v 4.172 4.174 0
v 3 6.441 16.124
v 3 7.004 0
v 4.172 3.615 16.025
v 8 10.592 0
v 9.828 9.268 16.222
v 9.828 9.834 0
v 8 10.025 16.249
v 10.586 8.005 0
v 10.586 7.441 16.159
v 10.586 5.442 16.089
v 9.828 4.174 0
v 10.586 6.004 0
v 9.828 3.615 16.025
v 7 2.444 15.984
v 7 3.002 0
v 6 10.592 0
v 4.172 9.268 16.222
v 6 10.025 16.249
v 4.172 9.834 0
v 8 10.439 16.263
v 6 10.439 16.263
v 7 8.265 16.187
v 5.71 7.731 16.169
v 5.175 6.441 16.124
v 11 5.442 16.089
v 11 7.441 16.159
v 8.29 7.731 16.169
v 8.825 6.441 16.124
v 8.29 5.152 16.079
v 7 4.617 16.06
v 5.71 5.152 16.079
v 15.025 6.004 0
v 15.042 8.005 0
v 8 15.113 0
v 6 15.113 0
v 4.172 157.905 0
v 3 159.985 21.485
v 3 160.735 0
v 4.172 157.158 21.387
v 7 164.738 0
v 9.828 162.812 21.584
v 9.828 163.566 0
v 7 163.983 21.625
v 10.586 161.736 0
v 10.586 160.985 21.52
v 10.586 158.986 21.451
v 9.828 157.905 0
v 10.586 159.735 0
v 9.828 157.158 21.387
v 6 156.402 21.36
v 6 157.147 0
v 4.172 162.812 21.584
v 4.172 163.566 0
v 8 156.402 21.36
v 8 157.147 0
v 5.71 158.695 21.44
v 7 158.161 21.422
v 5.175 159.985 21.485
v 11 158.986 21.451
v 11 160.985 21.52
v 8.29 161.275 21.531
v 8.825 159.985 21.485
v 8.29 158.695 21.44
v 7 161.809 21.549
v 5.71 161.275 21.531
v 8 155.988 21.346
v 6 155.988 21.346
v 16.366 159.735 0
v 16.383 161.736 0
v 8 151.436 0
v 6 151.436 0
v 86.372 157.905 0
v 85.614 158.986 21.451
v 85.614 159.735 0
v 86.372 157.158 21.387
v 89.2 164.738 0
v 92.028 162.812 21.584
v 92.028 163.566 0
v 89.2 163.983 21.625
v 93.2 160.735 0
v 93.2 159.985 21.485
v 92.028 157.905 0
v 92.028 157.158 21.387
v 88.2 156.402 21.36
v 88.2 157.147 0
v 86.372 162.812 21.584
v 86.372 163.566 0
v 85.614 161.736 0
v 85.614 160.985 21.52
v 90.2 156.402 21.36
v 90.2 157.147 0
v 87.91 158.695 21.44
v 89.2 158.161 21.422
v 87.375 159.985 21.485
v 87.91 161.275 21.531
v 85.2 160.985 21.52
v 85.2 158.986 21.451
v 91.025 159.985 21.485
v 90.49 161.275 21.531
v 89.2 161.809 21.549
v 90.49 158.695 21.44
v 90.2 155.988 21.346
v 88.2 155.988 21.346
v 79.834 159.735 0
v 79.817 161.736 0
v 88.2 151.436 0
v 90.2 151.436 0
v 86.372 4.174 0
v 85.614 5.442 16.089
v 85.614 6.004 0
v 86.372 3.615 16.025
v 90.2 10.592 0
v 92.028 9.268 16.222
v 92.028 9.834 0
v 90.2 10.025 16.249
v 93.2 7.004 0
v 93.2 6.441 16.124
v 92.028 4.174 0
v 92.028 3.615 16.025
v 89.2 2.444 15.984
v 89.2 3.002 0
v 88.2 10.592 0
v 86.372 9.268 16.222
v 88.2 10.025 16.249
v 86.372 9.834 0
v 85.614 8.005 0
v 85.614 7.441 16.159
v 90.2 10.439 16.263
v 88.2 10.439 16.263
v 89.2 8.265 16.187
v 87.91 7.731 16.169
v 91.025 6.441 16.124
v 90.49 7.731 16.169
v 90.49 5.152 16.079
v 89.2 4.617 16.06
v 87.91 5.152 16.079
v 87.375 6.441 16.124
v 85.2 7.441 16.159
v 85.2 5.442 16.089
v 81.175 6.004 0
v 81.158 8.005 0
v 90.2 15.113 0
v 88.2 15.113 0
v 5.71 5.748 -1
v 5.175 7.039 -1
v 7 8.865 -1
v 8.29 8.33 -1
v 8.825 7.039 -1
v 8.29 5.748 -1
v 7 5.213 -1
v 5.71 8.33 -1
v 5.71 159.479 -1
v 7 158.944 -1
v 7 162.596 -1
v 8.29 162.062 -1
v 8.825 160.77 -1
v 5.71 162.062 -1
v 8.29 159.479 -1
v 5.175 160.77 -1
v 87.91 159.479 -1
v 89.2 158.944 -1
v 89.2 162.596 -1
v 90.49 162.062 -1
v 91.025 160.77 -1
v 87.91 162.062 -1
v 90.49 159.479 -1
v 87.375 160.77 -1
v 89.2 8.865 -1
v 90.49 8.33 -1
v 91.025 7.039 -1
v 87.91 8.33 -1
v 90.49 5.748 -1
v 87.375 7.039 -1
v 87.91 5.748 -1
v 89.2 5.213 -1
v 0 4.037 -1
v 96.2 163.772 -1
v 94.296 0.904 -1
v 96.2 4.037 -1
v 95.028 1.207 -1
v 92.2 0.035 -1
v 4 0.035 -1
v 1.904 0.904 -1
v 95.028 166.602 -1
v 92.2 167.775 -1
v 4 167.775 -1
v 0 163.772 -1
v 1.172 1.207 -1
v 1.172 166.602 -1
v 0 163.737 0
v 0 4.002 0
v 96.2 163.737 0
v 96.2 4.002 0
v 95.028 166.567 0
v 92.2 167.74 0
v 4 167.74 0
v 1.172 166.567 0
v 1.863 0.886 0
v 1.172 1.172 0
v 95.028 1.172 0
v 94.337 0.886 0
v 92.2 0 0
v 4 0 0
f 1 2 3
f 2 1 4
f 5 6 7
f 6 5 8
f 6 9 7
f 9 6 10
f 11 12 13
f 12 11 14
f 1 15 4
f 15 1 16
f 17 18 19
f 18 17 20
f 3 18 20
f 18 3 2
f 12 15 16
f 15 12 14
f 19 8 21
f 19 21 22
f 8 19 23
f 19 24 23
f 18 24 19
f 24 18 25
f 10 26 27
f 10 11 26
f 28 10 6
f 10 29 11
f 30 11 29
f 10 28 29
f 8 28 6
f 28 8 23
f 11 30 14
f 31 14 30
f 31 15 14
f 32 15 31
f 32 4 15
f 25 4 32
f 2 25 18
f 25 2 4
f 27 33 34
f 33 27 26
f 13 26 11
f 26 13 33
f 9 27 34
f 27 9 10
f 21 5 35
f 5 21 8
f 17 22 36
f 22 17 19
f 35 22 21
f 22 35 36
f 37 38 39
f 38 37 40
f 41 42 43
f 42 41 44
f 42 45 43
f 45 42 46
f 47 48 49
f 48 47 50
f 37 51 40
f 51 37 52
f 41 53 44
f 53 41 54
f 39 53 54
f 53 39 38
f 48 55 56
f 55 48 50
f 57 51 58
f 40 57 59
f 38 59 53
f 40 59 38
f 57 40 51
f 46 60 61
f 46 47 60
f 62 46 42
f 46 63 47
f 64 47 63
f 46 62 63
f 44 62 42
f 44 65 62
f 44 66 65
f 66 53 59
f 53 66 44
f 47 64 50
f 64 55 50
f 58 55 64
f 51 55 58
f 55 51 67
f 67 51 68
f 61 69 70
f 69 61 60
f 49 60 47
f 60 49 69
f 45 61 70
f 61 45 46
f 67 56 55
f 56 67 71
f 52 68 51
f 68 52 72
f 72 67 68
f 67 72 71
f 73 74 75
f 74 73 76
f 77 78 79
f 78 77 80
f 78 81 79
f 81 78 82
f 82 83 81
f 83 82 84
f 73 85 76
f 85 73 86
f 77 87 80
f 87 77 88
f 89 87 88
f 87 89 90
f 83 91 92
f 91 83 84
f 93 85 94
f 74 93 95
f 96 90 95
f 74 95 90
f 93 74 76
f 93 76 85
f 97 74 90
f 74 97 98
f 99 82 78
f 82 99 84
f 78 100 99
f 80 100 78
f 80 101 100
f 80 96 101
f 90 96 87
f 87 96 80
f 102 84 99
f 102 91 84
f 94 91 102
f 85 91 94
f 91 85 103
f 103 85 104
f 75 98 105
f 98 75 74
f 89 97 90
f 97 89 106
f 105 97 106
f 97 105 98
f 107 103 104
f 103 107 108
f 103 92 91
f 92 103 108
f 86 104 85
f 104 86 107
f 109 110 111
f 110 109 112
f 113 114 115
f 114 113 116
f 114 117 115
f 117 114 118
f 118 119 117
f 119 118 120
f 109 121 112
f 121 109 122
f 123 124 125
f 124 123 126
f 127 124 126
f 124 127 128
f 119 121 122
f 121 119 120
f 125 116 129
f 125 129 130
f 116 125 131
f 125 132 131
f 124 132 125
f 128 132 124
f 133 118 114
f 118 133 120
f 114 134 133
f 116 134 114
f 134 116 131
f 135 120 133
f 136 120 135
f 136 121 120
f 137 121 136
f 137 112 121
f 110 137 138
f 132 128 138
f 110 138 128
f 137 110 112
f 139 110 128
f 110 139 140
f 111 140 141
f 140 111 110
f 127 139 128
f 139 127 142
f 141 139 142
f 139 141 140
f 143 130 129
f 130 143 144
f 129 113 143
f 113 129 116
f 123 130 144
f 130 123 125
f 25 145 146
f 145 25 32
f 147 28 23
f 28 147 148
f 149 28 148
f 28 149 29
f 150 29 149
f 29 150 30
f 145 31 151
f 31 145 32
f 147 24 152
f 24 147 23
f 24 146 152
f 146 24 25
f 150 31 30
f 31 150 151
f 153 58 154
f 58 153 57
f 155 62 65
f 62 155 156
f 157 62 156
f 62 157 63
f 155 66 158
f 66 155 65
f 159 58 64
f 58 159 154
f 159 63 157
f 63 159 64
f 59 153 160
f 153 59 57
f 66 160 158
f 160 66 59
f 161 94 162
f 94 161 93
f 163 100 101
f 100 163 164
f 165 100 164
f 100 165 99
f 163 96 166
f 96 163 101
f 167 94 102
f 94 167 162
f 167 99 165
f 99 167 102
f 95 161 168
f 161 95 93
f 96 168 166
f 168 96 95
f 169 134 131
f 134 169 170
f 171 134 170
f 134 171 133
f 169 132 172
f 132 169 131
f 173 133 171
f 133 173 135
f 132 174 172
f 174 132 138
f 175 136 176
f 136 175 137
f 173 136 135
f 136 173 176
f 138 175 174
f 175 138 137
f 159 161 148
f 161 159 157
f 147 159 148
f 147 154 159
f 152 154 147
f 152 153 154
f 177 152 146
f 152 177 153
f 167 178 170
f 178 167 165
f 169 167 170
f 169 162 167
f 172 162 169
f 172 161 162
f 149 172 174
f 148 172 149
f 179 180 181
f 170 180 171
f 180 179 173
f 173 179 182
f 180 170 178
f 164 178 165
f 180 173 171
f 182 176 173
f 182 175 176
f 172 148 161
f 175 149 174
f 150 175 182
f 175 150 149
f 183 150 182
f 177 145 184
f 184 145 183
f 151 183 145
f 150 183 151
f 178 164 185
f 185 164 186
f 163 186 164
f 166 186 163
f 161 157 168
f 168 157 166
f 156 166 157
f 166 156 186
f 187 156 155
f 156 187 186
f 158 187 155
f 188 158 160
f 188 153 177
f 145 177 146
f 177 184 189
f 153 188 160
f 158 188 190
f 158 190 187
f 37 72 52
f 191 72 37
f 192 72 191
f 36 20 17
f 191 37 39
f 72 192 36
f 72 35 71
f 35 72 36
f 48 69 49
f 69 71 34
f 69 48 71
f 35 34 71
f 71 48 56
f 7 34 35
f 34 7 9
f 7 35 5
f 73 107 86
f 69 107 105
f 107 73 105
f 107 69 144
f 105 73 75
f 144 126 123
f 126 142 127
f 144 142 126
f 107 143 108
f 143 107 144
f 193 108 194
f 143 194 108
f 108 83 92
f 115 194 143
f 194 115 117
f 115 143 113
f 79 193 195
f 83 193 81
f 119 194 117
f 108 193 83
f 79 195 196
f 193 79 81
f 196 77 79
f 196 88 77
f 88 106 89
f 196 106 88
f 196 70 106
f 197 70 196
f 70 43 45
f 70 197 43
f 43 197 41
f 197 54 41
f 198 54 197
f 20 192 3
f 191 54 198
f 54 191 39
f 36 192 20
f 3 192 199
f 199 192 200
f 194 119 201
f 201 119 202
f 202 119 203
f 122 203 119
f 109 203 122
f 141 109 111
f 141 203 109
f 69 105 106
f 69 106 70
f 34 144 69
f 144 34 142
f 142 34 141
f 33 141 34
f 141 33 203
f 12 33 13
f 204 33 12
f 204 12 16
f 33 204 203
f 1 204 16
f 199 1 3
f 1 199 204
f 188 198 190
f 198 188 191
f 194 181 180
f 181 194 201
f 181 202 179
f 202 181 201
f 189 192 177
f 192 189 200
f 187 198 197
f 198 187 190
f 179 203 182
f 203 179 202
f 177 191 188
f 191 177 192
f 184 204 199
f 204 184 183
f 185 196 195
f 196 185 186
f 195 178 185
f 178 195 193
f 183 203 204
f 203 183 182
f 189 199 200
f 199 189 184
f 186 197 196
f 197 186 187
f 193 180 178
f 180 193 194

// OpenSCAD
// Generated by SolidPython 1.1.3 on 2024-07-24 01:34:22
$fn = 8;


difference() {
	intersection() {
		union() {
			difference() {
				rotate(a = 2.0000000000, v = [1, 0, 0]) {
					translate(v = [0, 0, 16.4445000000]) {
						translate(v = [0, 157.6375000000, 0]) {
							translate(v = [10, 0, 0]) {
								difference() {
									translate(v = [-3, 0, 0]) {
										translate(v = [0, -150.6375000000, 0]) {
											translate(v = [0, 0, -68.5555000000]) {
												union() {
													translate(v = [0, 0, 0]) {
														translate(v = [0, 0, 0]) {
															union() {
																cylinder(h = 68, r = 4.0000000000);
																rotate(a = 90, v = [1, 0, 0]) {
																	linear_extrude(center = true, height = 2) {
																		polygon(paths = [[0, 1, 2, 3]], points = [[0, 0], [0, 68], [4.0000000000, 68], [21.0000000000, 0]]);
																	}
																}
																rotate(a = 90, v = [0, 0, 1]) {
																	rotate(a = 90, v = [1, 0, 0]) {
																		linear_extrude(center = true, height = 2) {
																			polygon(paths = [[0, 1, 2, 3]], points = [[0, 0], [0, 68], [4.0000000000, 68], [21.0000000000, 0]]);
																		}
																	}
																}
															}
														}
													}
													translate(v = [0, 0, 0]) {
														translate(v = [0, 153.6375000000, 0]) {
															union() {
																cylinder(h = 68, r = 4.0000000000);
																rotate(a = 90, v = [1, 0, 0]) {
																	linear_extrude(center = true, height = 2) {
																		polygon(paths = [[0, 1, 2, 3]], points = [[0, 0], [0, 68], [4.0000000000, 68], [21.0000000000, 0]]);
																	}
																}
																rotate(a = 270, v = [0, 0, 1]) {
																	rotate(a = 90, v = [1, 0, 0]) {
																		linear_extrude(center = true, height = 2) {
																			polygon(paths = [[0, 1, 2, 3]], points = [[0, 0], [0, 68], [4.0000000000, 68], [21.0000000000, 0]]);
																		}
																	}
																}
															}
														}
													}
													translate(v = [82.2000000000, 0, 0]) {
														translate(v = [0, 153.6375000000, 0]) {
															union() {
																cylinder(h = 68, r = 4.0000000000);
																rotate(a = 180, v = [0, 0, 1]) {
																	rotate(a = 90, v = [1, 0, 0]) {
																		linear_extrude(center = true, height = 2) {
																			polygon(paths = [[0, 1, 2, 3]], points = [[0, 0], [0, 68], [4.0000000000, 68], [21.0000000000, 0]]);
																		}
																	}
																}
																rotate(a = 270, v = [0, 0, 1]) {
																	rotate(a = 90, v = [1, 0, 0]) {
																		linear_extrude(center = true, height = 2) {
																			polygon(paths = [[0, 1, 2, 3]], points = [[0, 0], [0, 68], [4.0000000000, 68], [21.0000000000, 0]]);
																		}
																	}
																}
															}
														}
													}
													translate(v = [82.2000000000, 0, 0]) {
														translate(v = [0, 0, 0]) {
															union() {
																cylinder(h = 68, r = 4.0000000000);
																rotate(a = 180, v = [0, 0, 1]) {
																	rotate(a = 90, v = [1, 0, 0]) {
																		linear_extrude(center = true, height = 2) {
																			polygon(paths = [[0, 1, 2, 3]], points = [[0, 0], [0, 68], [4.0000000000, 68], [21.0000000000, 0]]);
																		}
																	}
																}
																rotate(a = 90, v = [0, 0, 1]) {
																	rotate(a = 90, v = [1, 0, 0]) {
																		linear_extrude(center = true, height = 2) {
																			polygon(paths = [[0, 1, 2, 3]], points = [[0, 0], [0, 68], [4.0000000000, 68], [21.0000000000, 0]]);
																		}
																	}
																}
															}
														}
													}
												}
											}
										}
									}
									translate(v = [-3, 0, 0]) {
										translate(v = [0, -150.6375000000, 0]) {
											union() {
												translate(v = [0, 0, 0]) {
													translate(v = [0, 0, 0]) {
														cylinder(center = true, h = 272, r = 1.8250000000);
													}
												}
												translate(v = [0, 0, 0]) {
													translate(v = [0, 153.6375000000, 0]) {
														cylinder(center = true, h = 272, r = 1.8250000000);
													}
												}
												translate(v = [82.2000000000, 0, 0]) {
													translate(v = [0, 153.6375000000, 0]) {
														cylinder(center = true, h = 272, r = 1.8250000000);
													}
												}
												translate(v = [82.2000000000, 0, 0]) {
													translate(v = [0, 0, 0]) {
														cylinder(center = true, h = 272, r = 1.8250000000);
													}
												}
											}
										}
									}
								}
							}
						}
					}
				}
				translate(v = [0, 0, -1]) {
					translate(v = [0, 0, -100]) {
						translate(v = [0, -83.8187500000, 0]) {
							translate(v = [-48.1000000000, 0, 0]) {
								cube(size = [192.4000000000, 335.2750000000, 100]);
							}
						}
					}
				}
			}
			intersection() {
				translate(v = [0, 0, -1]) {
					translate(v = [-48.1000000000, 0, 0]) {
						translate(v = [0, -83.8187500000, 0]) {
							cube(size = [192.4000000000, 335.2750000000, 1]);
						}
					}
				}
				rotate(a = 2.0000000000, v = [1, 0, 0]) {
					translate(v = [0, 0, 16.4445000000]) {
						translate(v = [0, 157.6375000000, 0]) {
							translate(v = [10, 0, 0]) {
								translate(v = [0, 0, -34.0000000000]) {
									translate(v = [38.1000000000, 0, 0]) {
										translate(v = [0, -73.8187500000, 0]) {
											minkowski() {
												cube(center = true, size = [88.2000000000, 159.6375000000, 68]);
												cylinder(center = true, h = 0.5555000000, r = 4);
											}
										}
									}
								}
							}
						}
					}
				}
			}
		}
		translate(v = [0, 0, 16.4445000000]) {
			translate(v = [0, 157.6375000000, 0]) {
				translate(v = [10, 0, 0]) {
					translate(v = [-10.0000000000, 0, 0]) {
						translate(v = [0, -251.4562500000, 0]) {
							translate(v = [0, 0, -34.0000000000]) {
								cube(size = [96.2000000000, 335.2750000000, 136]);
							}
						}
					}
				}
			}
		}
	}
	rotate(a = 2.0000000000, v = [1, 0, 0]) {
		translate(v = [0, 0, 16.4445000000]) {
			translate(v = [0, 157.6375000000, 0]) {
				translate(v = [10, 0, 0]) {
					translate(v = [-3, 0, 0]) {
						translate(v = [0, -150.6375000000, 0]) {
							union() {
								translate(v = [0, 0, 0]) {
									translate(v = [0, 0, 0]) {
										cylinder(center = true, h = 272, r = 1.8250000000);
									}
								}
								translate(v = [0, 0, 0]) {
									translate(v = [0, 153.6375000000, 0]) {
										cylinder(center = true, h = 272, r = 1.8250000000);
									}
								}
								translate(v = [82.2000000000, 0, 0]) {
									translate(v = [0, 153.6375000000, 0]) {
										cylinder(center = true, h = 272, r = 1.8250000000);
									}
								}
								translate(v = [82.2000000000, 0, 0]) {
									translate(v = [0, 0, 0]) {
										cylinder(center = true, h = 272, r = 1.8250000000);
									}
								}
							}
						}
					}
				}
			}
		}
	}
}
/***********************************************
*********      SolidPython code:      **********
************************************************
 
#!/usr/bin/env python3

import argparse
from asyncio import subprocess
import json
# import math
import re
import logging
import os
# import os.path
import subprocess
# import time

from solid import *
from solid.utils import *

from parameters import Parameters
from keyboard import Keyboard
from cable import Cable

# Set logger level variables
console_logging_level = logging.WARN
file_logging_level = logging.DEBUG


# Get root logger and set main logger level to DEBUG
logger = logging.getLogger()
logger.setLevel(logging.DEBUG)


# Create formatters
console_formatter = logging.Formatter('%(name)s %(levelname)s: %(funcName)s: [%(lineno)d]: %(message)s')
file_formatter = logging.Formatter('%(asctime)s %(levelname)s %(name)s: %(funcName)s: [%(lineno)d]: %(message)s')

# Create console handler and set level to info
console_handler = logging.StreamHandler()
console_handler.setLevel(console_logging_level)

# Add formatter to console_handler
console_handler.setFormatter(console_formatter)

# Add console handler to logger
logger.addHandler(console_handler)

# Get file info that will be used to creat log file
script_location = Path(os.path.dirname(os.path.realpath(__file__)))
log_file_name = 'generator.log'
log_file_path = script_location / log_file_name

# Create file handler and set level to info
file_handler = logging.FileHandler(log_file_path, mode = 'w')
file_handler.setLevel(file_logging_level)

# Add formatter to file_handler
file_handler.setFormatter(file_formatter)

# Add file handler to logger
logger.addHandler(file_handler)


# Helper for parser to wnsure filename argument has to correct extension
def CheckExt(choices):
    class Act(argparse.Action):
        def __call__(self,parser,namespace,fname,option_string=None):
            ext = os.path.splitext(fname)[1][1:]
            if ext not in choices:
                option_string = '({})'.format(option_string) if option_string else ''
                parser.error("file doesn't end with one of {}{}".format(choices,option_string))
            else:
                setattr(namespace,self.dest,fname)

    return Act



def main():

    parser = argparse.ArgumentParser(description='Build custom keyboard SCAD file using keyboard layout editor format')
    parser.add_argument('-i', '--input-file', metavar = 'layout_json_file_name.json', help = 'A path to a keyboard layout editor json file', required = True, action=CheckExt({'json'}))
    # parser.add_argument('-o', '--output-folder', metavar = 'scad', help = 'A path to a folder to store the generated open scad file')
    parser.add_argument('-p', '--parameter-file', metavar = 'parameters.json', help = 'A JSON file containing paramters for the object buing made', default = None, action=CheckExt({'json'}))
    parser.add_argument('-s', '--section', metavar = 'section_num', help = 'The number of the section that should be built', type = int, default = -1)
    parser.add_argument('-a', '--all-sections', help = 'Output all the parts for all possible sections in separate files', default = False, action = 'store_true')
    parser.add_argument('-e', '--exploded', help = 'Create test file with each section shown as an exploded view', default = False, action = 'store_true')
    parser.add_argument('-f', '--fragments', metavar = 'num_fragments', help = 'The number of fragments to be used when creating curves', type = int, default = 8)
    parser.add_argument('-r', '--render', help = 'Render an STL from the generated scad file', default = False, action = 'store_true')
    parser.add_argument('--switch-type-in-filename', help = 'Add the switch type name and stabilizer type name to the filname', default = False, action = 'store_true')

    # Parse command line arguments
    args = parser.parse_args()
    logger.debug(vars(args))

    # Create Path object from input file argument
    input_file_path = Path(args.input_file)

    # Get base folder path
    base_path = input_file_path.parent

    # Get input file name onle
    file_name_only = input_file_path.name
    
    # Get layout name from file name
    layout_name = input_file_path.stem

    # Generate output scad and stl output folder paths
    output_base_folder = base_path / layout_name
    scad_folder_path = output_base_folder / 'scad'
    stl_folder_path = output_base_folder / 'stl'

    # Ensure all outpur folders exists
    if output_base_folder.is_dir() == False:
        output_base_folder.mkdir()

    if scad_folder_path.is_dir() == False:
        scad_folder_path.mkdir()

    if stl_folder_path.is_dir() == False:
        stl_folder_path.mkdir()

    logger.debug('layout_name: %s', str(layout_name))
    logger.debug('base_path: %s', str(base_path))
    logger.debug('file_name_only: %s', str(file_name_only))
    
    # define output file extensions
    scad_postfix = '.scad'
    stl_postfix  = '.stl'

    # Set fragments per circle
    FRAGMENTS = args.fragments
    logger.debug('\tFragments: %d', FRAGMENTS)

    # Pattern and Replacement strings to be used when trying to turn keyboard-layout-editor raw output into valid JSON
    json_key_pattern = '([{,])([xywha1]+):'
    json_key_replace = '\\1"\\2":'

    # Open JSON layout file
    logger.debug('Open layout file %s', input_file_path)
    try:
        # Try with utf-8 encoding specified
        f = open(input_file_path, encoding="utf-8")
    except:
        # Failed to open
        logger.info('Failed to open layout file with utf-8 encoding specified. Try opening without specifying an encoding')
        try:
            # Try opening with no encoding spcificed
            f = open(input_file_path)
        except:
            logger.error('Failed to open layout file both spefifying utf-8 andcoding and not specifying any encodeing. Exiting')
            exit(1)

    logger.debug('Read layout JSON string from file %s', input_file_path)
    try:
        keyboard_layout = f.read()
    except UnicodeDecodeError:
        logger.error('Unable to decode layout file. Please provide utf-8 encoded files')
        exit(-1)

    keyboard_layout_dict = None

    # Load keyboard layout dictionary
    logger.debug('Parse layout file JSON string')
    try:
        # Attempt to parse to provided JSON string
        keyboard_layout_dict = json.loads(keyboard_layout)
        logger.debug('Valid Json Parsed')
    except:
        # Failed to parse the JSON test.
        # This most likely means that the keybaord-layout-editor raw output was provided
        # Attempt to modify that string to make it valid JSON
        keyboard_layout = '[%s]' % (keyboard_layout)
        keyboard_layout = re.sub(json_key_pattern, json_key_replace, keyboard_layout)
        try:
            keyboard_layout_dict = json.loads(keyboard_layout)
            logger.info('Initial layout Json Invalid. Json modified and parsed')
        except:
            logger.error('Failed to parse layout json after attempt at correction.')
            raise

    logger.debug('keyboard_layout_dict: %s', str(keyboard_layout_dict))


    # Read parameter file
    parameter_dict = None
    if args.parameter_file is not None:
        # Open JSON parameter file
        logger.debug('Open parameter file %s', args.parameter_file)
        try:
            # Try with utf-8 encoding specified
            f = open(args.parameter_file, encoding="utf-8")
        except:
            # Failed to open
            logger.info('Failed to open parameter file with utf-8 encoding specified. Try opening without specifying an encoding')
            try:
                # Try opening with no encoding spcificed
                f = open(args.parameter_fil)
            except:
                logger.error('Failed to open parameter file both spefifying utf-8 andcoding and not specifying any encodeing. Exiting')
                exit(1)
        

        logger.debug('Read JSON string from parameter file %s', args.parameter_file)
        try:
             parameter_file_text = f.read()
        except UnicodeDecodeError:
            logger.error('Unable to decode parameter file. Please provide utf-8 encoded files')
            exit(-1)
       
        logger.debug('Parse parameter JSON string')
        try:
            parameter_dict = json.loads(parameter_file_text)
            logger.debug('Valid Json Parsed')
        except:
            logger.error('Failed to parse parameter JSON file.')
            raise

        logger.debug('parameter_dict: %s', str(parameter_dict))


    # Set parameters from imput file
    parameters = Parameters(parameter_dict)
    
    # Create Keyboard instance
    keyboard = Keyboard(parameters)

    # Process the keyboard layout object
    keyboard.process_keyboard_layout(keyboard_layout_dict)
    keyboard.process_custom_shapes()

    logger.debug('kerf: %f', keyboard.kerf)

    # Dictionary of SolidPython solid objects that need to be rendered to SCAD and to STL if desired
    solid_object_dict = {}

    # Create objects for each of the generated sections
    if args.all_sections == True:
        # Iterate over all sections generated and add all sections to solid_object_dict
        for section in range(keyboard.get_top_section_count()):
            # Set current section for generator
            keyboard.set_section(section)

            # Create dict for section
            solid_object_dict[section] = {}

            # Add top assembly, plate, and all assembly to section dict
            solid_object_dict[section]['top'] = keyboard.get_assembly(top = True)
            solid_object_dict[section]['all'] = keyboard.get_assembly(all = True)
            solid_object_dict[section]['plate'] = keyboard.get_assembly(plate_only = True)

            # If there is a bottom section for the current section add it to section dict
            if section < keyboard.get_bottom_section_count():
                solid_object_dict[section]['bottom'] = keyboard.get_assembly(bottom = True)
            
    # Create exploded object
    elif args.exploded == True:
        solid_object_dict[-1] = {}
        solid_object_dict[-1]['top'] = union()
        solid_object_dict[-1]['plate'] = union()
        solid_object_dict[-1]['bottom'] = union()
        for section in range(keyboard.get_top_section_count()):
            keyboard.set_section(section)
            solid_object_dict[-1]['top'] += up(5 * section) ( right(10 * section) ( keyboard.get_assembly(top = True) ) )
            solid_object_dict[-1]['plate'] += up(5 * section) ( right(10 * section) ( keyboard.get_assembly(plate_only = True) ) )
            if section < keyboard.get_bottom_section_count():
                solid_object_dict[-1]['bottom'] += up(5 * section) ( right(10 * section) ( keyboard.get_assembly(bottom = True) ) )
    

    # Create objects for a specified section
    elif args.section > -1:
        # Set desired section to create
        keyboard.set_section(args.section)

        # Create dict for section
        solid_object_dict[args.section] = {}

        # Add top assembly, plate, and all assembly to section dict
        solid_object_dict[args.section]['top'] = keyboard.get_assembly(top = True)
        solid_object_dict[args.section]['all'] = keyboard.get_assembly(all = True)
        solid_object_dict[args.section]['plate'] = keyboard.get_assembly(plate_only = True)

        # If there is a bottom section for the current section add it to section dict
        if args.section < keyboard.get_bottom_section_count():
            solid_object_dict[args.section]['bottom'] = keyboard.get_assembly(bottom = True)

    # Create an objects that are not split into sections. No other options were specified
    else:
        logger.debug('Create whole object. No other options specified')
        solid_object_dict['all'] = {}
        solid_object_dict['all']['top'] = keyboard.get_assembly(top = True)
        solid_object_dict['all']['bottom'] = keyboard.get_assembly(bottom = True)
        solid_object_dict['all']['all'] = keyboard.get_assembly(all = True)
        solid_object_dict['all']['plate'] = keyboard.get_assembly(plate_only = True)
    
    # Add global items that are not dependant on the sctions or parts of the item to build
    solid_object_dict['global'] = {}

    # Generate a strain relief piece for the cable hole
    if parameters.cable_hole == True:
        cable = Cable(parameters)
        solid_object_dict['global']['cable_holder_main'] = cable.holder_main()
        solid_object_dict['global']['cable_holder_clamp'] = cable.holder_clamp()
        solid_object_dict['global']['cable_holder_all'] = cable.holder_all()

    print(parameters)
    print('Case Height: %f, Case Width: %f\n' % (parameters.real_case_height, parameters.real_case_width))
    
    logger.info('Case Height: %f, Case Width: %f', parameters.real_case_height, parameters.real_case_width)
    logger.info('Sections In Top: %d', keyboard.get_top_section_count())
    logger.info('Sections In Bottom: %d', keyboard.get_bottom_section_count())


    ############################################################
    # Render SCAD and STL files
    ############################################################
    subprocess_dict = {}

    switch_type_for_filename = ''
    stab_type_for_filename = ''

    for section in solid_object_dict.keys():

        if args.switch_type_in_filename == True:
            switch_type_for_filename = '_' + parameters.switch_type
            stab_type_for_filename = '_' + parameters.stabilizer_type

        section_postfix = ''

        # Creating global items that have no relaton to switch type
        if isinstance(section, str) and section == 'global':
            switch_type_for_filename = ''
            stab_type_for_filename = ''
        
        # If the current object dict section is an int greater than -1 add the section number to the filename
        if isinstance(section, int) and section > -1:
            section_postfix = '_section_%d' % (section)
        
        if args.exploded == True:
            section_postfix = '_exploded'

        for part_name in solid_object_dict[section].keys():
            part_name_formatted = '_' + part_name

            scad_file_name = scad_folder_path / (layout_name + section_postfix + part_name_formatted + switch_type_for_filename + stab_type_for_filename + scad_postfix)
            stl_file_name = stl_folder_path / (layout_name + section_postfix + part_name_formatted + switch_type_for_filename + stab_type_for_filename + stl_postfix)

            if solid_object_dict[section][part_name] is not None:
                logger.info('Generate scad file with name %s', scad_file_name)
                # Generate SCAD file from assembly
                scad_render_to_file(solid_object_dict[section][part_name], scad_file_name, file_header=f'$fn = {FRAGMENTS};')
                print('Generated scad file with name', scad_file_name)
                
                # Render STL if option is chosen
                if args.render:
                    logger.debug('Render STL from SCAD')
                    logger.info('Generate stl file with name %s from %s', stl_file_name, scad_file_name)

                    openscad_command_list = ['openscad', '-o', '%s' % (stl_file_name), '%s' % (scad_file_name)]
                    subprocess_dict[stl_file_name] = subprocess.Popen(openscad_command_list)
    
    
    ################################################################
    #  Wait for render processes to complete
    ################################################################
    if args.render:
        logger.debug(subprocess_dict)
        running = True
        while running == True:
            running = False
            for stl_file_name in subprocess_dict.keys():
                p = subprocess_dict[stl_file_name]
                if p is not None:
                    # running = True
                    rcode = None
                    try:
                        rcode = p.wait(.1)
                    except subprocess.TimeoutExpired as err:
                        running = True
                    if rcode is not None:
                        logger.info('Render Complete: file: %s', stl_file_name)
                        print('Render Complete: file:', stl_file_name)
                        subprocess_dict[stl_file_name] = None
            # time.sleep(1)



    logger.info('Generation Complete')

if __name__ == "__main__":
    main()
 
 
************************************************/
